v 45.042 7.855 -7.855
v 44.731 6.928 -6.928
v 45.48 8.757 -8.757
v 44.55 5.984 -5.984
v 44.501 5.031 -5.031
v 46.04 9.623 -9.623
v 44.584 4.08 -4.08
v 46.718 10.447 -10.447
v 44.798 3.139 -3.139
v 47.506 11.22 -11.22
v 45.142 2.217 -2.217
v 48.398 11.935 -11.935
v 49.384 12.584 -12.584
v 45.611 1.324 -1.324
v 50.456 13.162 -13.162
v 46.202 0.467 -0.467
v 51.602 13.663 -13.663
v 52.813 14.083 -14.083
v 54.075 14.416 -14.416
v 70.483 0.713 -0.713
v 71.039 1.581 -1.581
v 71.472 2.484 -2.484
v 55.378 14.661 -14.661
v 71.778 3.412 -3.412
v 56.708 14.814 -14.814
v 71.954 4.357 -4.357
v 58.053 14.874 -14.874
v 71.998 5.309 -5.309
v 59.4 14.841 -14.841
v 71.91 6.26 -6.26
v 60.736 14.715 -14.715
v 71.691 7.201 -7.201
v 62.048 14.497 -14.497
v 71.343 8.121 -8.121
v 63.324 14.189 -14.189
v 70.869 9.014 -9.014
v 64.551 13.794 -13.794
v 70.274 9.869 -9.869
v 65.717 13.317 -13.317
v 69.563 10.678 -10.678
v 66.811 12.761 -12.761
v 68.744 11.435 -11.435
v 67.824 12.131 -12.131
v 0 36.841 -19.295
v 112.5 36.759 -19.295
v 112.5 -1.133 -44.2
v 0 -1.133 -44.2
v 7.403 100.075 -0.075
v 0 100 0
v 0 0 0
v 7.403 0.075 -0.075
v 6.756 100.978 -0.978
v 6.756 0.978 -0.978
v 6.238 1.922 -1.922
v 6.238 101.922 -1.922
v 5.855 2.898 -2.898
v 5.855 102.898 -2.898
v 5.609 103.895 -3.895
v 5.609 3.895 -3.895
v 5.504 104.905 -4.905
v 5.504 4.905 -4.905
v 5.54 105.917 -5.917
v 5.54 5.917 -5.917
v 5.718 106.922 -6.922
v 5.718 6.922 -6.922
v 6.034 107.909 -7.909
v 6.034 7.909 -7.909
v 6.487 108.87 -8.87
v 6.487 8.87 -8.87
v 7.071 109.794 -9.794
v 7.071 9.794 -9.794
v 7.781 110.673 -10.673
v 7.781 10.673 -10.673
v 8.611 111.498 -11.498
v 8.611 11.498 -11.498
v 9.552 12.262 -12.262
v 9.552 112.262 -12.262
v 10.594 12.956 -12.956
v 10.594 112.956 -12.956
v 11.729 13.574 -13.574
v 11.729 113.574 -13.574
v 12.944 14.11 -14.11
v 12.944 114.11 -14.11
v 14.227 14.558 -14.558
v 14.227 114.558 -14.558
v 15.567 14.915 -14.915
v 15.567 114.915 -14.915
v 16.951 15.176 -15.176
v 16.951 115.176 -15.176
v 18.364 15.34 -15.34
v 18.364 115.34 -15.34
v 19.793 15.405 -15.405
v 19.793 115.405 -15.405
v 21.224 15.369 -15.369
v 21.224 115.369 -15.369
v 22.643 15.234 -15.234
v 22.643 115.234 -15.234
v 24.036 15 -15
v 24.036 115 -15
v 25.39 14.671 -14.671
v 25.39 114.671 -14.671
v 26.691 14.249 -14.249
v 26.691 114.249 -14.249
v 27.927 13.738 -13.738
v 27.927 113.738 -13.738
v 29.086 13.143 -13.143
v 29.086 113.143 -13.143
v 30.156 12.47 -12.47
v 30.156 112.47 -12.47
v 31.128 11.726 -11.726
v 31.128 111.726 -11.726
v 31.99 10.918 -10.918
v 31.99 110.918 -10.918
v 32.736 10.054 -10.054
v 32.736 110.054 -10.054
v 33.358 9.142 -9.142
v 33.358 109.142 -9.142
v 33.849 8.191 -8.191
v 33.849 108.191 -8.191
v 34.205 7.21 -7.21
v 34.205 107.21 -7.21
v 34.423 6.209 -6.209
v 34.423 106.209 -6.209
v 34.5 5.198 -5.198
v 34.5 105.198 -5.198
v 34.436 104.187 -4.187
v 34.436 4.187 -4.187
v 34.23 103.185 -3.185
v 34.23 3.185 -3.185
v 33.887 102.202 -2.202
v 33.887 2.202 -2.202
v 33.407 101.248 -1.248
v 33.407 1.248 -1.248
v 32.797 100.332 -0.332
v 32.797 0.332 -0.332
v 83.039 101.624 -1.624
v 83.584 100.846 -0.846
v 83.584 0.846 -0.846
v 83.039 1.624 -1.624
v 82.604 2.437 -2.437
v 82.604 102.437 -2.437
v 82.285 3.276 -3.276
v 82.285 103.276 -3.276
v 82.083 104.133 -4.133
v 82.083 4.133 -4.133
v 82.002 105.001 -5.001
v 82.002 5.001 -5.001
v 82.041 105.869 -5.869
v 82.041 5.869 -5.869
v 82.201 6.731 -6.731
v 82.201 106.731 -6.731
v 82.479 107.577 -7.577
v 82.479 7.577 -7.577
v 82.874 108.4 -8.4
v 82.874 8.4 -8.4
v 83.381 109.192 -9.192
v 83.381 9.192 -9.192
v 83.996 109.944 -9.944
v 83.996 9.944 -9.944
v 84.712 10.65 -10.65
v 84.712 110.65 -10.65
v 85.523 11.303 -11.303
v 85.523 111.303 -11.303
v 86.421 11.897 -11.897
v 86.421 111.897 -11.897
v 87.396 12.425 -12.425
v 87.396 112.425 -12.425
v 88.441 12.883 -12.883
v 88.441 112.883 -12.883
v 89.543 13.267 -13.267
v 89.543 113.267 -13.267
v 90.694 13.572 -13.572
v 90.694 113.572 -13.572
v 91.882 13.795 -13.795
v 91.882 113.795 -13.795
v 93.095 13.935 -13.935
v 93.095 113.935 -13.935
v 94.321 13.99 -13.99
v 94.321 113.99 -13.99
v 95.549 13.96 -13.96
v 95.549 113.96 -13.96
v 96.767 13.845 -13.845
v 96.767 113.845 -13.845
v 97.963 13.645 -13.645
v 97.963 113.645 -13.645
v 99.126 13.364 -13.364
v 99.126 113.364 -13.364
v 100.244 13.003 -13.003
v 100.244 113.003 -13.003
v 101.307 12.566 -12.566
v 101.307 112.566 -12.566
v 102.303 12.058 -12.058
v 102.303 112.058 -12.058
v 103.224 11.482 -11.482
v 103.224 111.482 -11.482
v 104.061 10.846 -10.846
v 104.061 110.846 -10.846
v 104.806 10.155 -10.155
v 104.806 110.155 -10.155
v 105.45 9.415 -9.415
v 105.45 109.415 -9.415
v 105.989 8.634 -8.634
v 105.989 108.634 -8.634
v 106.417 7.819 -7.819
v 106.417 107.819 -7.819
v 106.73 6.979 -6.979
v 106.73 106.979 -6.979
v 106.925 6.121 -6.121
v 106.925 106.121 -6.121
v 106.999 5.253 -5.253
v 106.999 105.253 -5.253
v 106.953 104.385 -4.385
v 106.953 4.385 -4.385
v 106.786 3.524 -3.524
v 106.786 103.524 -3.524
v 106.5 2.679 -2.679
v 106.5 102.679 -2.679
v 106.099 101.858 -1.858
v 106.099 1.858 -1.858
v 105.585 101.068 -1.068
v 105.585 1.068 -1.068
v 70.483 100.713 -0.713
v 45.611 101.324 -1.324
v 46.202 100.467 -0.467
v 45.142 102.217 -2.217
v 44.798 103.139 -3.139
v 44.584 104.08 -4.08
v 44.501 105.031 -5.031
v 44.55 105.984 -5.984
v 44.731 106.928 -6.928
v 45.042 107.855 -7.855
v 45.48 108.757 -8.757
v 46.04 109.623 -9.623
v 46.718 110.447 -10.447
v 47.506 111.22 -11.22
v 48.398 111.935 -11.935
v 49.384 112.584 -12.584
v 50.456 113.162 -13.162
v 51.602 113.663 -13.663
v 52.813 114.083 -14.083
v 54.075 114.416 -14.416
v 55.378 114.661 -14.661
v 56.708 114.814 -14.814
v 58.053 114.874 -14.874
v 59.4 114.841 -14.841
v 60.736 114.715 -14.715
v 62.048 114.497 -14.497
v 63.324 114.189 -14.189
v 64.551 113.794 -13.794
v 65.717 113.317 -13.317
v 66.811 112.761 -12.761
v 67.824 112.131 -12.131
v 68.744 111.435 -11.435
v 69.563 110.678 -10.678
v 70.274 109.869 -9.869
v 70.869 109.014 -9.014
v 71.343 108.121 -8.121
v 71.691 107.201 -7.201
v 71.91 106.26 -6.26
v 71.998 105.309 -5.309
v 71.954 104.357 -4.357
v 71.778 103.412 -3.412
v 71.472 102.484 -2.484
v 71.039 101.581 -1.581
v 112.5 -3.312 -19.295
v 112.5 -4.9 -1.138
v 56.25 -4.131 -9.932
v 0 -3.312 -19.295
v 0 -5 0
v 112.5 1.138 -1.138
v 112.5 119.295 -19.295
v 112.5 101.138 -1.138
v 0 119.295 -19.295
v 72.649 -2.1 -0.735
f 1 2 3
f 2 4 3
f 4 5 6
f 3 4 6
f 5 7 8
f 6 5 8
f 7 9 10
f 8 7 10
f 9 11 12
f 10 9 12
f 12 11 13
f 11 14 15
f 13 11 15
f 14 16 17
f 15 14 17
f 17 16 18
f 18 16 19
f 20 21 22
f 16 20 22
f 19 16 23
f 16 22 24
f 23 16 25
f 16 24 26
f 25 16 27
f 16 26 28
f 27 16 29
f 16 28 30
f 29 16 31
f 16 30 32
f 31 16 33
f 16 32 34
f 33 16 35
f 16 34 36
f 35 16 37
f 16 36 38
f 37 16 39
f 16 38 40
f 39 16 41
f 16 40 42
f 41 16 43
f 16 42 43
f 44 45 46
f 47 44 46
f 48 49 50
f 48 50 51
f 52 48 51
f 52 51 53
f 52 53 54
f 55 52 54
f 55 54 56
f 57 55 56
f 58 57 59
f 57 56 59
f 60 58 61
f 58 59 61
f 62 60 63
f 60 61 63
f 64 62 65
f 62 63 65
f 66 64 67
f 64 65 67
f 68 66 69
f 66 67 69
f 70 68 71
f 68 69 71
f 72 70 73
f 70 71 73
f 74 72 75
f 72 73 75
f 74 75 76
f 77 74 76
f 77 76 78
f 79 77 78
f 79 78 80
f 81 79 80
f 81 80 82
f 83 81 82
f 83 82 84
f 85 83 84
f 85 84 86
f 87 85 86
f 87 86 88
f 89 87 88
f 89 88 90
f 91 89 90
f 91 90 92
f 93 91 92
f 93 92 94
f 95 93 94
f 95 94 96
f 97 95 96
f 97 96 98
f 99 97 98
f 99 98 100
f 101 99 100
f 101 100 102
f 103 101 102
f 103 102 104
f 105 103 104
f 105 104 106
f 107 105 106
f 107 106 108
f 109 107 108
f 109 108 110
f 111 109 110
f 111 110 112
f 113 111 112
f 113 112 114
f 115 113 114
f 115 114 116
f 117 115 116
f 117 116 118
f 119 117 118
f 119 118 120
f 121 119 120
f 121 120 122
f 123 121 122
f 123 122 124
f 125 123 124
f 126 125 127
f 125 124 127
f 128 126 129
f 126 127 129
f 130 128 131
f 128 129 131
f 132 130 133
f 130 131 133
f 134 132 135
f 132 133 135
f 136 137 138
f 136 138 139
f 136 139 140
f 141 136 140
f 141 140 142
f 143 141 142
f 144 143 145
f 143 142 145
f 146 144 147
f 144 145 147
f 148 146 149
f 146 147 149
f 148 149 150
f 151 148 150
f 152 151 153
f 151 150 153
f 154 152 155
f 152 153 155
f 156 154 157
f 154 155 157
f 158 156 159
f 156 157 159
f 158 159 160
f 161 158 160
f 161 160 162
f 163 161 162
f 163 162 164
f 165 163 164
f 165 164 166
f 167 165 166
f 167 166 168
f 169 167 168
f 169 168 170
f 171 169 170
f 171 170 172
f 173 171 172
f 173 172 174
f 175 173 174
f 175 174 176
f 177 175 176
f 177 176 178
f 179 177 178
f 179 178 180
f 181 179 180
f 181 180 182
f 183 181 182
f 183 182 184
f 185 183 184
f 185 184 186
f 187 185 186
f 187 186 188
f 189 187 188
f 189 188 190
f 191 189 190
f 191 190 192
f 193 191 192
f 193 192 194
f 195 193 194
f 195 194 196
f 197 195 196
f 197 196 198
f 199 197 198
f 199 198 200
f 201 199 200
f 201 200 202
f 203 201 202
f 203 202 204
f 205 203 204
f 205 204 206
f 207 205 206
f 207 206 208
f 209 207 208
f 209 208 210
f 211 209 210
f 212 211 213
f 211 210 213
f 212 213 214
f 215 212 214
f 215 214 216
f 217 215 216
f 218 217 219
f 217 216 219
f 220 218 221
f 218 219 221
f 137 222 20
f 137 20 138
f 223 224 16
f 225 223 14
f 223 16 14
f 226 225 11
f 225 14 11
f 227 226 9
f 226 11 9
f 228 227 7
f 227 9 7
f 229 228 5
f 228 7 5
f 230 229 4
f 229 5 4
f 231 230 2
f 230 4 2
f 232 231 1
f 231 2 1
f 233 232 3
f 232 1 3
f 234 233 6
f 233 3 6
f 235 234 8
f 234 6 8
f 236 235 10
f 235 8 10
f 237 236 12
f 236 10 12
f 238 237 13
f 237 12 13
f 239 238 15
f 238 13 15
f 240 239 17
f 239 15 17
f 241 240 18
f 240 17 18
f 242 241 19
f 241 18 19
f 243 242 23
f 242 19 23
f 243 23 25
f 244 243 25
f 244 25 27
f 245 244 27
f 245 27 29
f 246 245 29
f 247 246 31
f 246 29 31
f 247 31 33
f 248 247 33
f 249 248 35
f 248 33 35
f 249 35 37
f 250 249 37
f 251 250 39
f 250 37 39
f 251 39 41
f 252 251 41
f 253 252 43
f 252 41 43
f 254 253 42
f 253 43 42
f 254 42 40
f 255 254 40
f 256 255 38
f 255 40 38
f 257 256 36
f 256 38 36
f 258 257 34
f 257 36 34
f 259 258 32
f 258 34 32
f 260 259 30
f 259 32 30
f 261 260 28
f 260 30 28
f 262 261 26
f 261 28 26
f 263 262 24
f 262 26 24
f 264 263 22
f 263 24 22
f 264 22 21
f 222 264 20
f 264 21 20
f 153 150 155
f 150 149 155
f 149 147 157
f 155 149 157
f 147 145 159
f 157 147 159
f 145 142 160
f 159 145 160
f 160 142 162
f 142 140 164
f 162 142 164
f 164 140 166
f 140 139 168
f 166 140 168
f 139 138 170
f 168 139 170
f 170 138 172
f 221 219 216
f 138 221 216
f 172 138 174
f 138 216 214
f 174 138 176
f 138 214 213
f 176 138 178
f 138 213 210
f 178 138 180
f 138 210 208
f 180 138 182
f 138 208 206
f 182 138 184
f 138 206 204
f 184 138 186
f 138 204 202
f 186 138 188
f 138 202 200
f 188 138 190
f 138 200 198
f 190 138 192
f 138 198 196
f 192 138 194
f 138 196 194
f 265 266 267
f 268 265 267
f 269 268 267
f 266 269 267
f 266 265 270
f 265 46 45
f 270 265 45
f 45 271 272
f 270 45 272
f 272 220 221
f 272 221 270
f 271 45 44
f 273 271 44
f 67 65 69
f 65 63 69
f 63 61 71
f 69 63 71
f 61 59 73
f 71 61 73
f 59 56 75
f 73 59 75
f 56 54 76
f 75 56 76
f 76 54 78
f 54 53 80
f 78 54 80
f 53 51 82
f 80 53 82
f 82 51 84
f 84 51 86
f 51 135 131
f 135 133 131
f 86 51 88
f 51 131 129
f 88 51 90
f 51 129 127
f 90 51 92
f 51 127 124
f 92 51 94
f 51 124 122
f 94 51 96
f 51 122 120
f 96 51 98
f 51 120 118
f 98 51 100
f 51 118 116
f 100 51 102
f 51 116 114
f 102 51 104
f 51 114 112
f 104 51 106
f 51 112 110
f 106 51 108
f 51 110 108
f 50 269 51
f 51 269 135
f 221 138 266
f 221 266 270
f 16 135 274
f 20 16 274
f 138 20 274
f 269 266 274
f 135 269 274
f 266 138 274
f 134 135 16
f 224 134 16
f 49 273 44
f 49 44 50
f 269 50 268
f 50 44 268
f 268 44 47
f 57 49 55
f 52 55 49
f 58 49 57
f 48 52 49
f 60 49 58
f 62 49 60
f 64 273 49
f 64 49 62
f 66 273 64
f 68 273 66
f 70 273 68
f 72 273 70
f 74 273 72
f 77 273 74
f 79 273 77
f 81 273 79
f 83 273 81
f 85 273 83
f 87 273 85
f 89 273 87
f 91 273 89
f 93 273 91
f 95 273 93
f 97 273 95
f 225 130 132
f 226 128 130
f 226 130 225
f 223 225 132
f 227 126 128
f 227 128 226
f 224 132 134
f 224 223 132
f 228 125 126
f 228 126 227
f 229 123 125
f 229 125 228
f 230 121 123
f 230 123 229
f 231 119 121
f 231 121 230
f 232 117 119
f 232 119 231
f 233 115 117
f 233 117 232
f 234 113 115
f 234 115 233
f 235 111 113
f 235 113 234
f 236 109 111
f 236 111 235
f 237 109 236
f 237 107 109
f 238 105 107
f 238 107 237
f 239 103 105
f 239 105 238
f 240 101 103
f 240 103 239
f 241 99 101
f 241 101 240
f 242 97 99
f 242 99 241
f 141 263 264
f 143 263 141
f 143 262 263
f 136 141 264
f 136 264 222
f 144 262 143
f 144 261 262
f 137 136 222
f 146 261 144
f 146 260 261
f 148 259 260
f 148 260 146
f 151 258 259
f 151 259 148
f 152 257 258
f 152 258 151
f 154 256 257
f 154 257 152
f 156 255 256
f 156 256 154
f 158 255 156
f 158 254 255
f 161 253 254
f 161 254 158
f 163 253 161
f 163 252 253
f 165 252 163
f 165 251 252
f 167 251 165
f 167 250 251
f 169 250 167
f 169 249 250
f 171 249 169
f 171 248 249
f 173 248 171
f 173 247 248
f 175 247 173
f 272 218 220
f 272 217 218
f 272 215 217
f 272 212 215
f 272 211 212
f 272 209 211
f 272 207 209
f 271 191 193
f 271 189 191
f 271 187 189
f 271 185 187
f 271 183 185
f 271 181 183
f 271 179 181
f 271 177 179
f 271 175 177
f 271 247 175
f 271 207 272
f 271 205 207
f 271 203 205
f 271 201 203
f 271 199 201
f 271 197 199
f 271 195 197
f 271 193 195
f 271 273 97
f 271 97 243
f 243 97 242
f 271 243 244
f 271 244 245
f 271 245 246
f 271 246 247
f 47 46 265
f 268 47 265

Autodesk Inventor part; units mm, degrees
ref_plane "YZ Plane" through (0, 0, 0) normal (1, 0, 0) x (0, 1, 0)
ref_plane "XZ Plane" through (0, 0, 0) normal (0, 1, 0) x (-1, 0, 0)
sketch "Sketch1" plane through (0, 0, 0) normal (0, 0, 1) x (1, 0, 0)
  arc A0 (12.7973, -6.8176) -> (-12.597, -7.1809) centre (0, 0) ccw
  arc A1 (50.4829, -6.2785) -> (26.2017, -6.6259) centre (38.25, 0) ccw
  arc A2 (85.5853, -5.7763) -> (63.5844, -6.091) centre (74.5, 0) ccw
  arc A3 (117.8988, -5.314) -> (98.5072, -5.5914) centre (108.125, 0) ccw
  arc A4 (147.9764, -4.8837) -> (130.6669, -5.1313) centre (139.25, 0) ccw
  arc A5 (177.1345, -4.4665) -> (160.4967, -4.7045) centre (168.75, 0) ccw
  line L0 (-20, 20) -> (188.75, 20)
  line L1 (188.75, 20) -> (188.75, -4.3003)
  line L2 (-20, 20) -> (-20, -7.2868)
  line L3 (-20, -7.2868) -> (188.75, -4.3003)
  dimension "d0" = 29
  dimension "d1" = 27.5
  dimension "d2" = 25
  dimension "d3" = 22.25
  dimension "d4" = 20
  dimension "d5" = 19
  dimension "d6" = 38.25
  dimension "d7" = 36.25
  dimension "d8" = 33.625
  dimension "d9" = 31.125
  dimension "d10" = 29.5
  dimension "d11" = 0
  dimension "d12" = 0
  dimension "d13" = 0
  dimension "d14" = 0
  dimension "d15" = 0
  dimension "d20" = 20
  dimension "d22" = 20
  dimension "d23" = 20
  dimension "d24" = 7
  dimension "d25" = 4.586
sketch "Sketch4" plane through (0, 0, 0) normal (1, 0, 0) x (0, 1, 0)
  line L0 (0, 0) -> (29.9033, -29.9033)
  line L1 (0, 5.9807) -> (0, -35.884) projected
  point P0 (100, 0)
  dimension "d51" = 45
  dimension "d53" = 0
  dimension "d55" = 29.9033
  dimension "d98" = 100
ref_plane "Work Plane4" through (0, 100, 0) normal (0, 0.7071068, 0.7071068) x (1, 0, 0)
ref_plane "Work Plane3" through (-10, 0, 0) normal (0, 0.7071068, 0.7071068) x (1, 0, 0)
sketch "Sketch5" plane through (-10, 0, 0) normal (0, 0.7071068, 0.7071068) x (1, 0, 0)
  arc A0 (42.7973, 0.4692) -> (17.403, 0.1059) centre (30, 7.2868) ccw
  arc A1 (80.4829, 1.0084) -> (56.2017, 0.661) centre (68.25, 7.2868) ccw
  arc A2 (115.5853, 1.5106) -> (93.5844, 1.1958) centre (104.5, 7.2868) ccw
  arc A3 (147.8988, 1.9729) -> (128.5072, 1.6954) centre (138.125, 7.2868) ccw
  arc A4 (177.9764, 2.4032) -> (160.6669, 2.1555) centre (169.25, 7.2868) ccw
  arc A5 (207.1345, 2.8203) -> (190.4967, 2.5823) centre (198.75, 7.2868) ccw
  line L0 (10, 27.2868) -> (218.75, 27.2868)
  line L1 (218.75, 27.2868) -> (218.75, 2.9865)
  line L2 (10, 27.2868) -> (10, 0)
  line L3 (10, 0) -> (17.403, 0.1059)
  line L4 (42.7973, 0.4692) -> (56.2017, 0.661)
  line L5 (80.4829, 1.0084) -> (93.5844, 1.1958)
  line L6 (115.5853, 1.5106) -> (128.5072, 1.6954)
  line L7 (207.1345, 2.8203) -> (218.75, 2.9865)
  line L8 (147.8988, 1.9729) -> (160.6669, 2.1555)
  line L9 (177.9764, 2.4032) -> (190.4967, 2.5823)
  dimension "d56" = 29
  dimension "d57" = 27.5
  dimension "d58" = 25
  dimension "d59" = 22.25
  dimension "d60" = 20
  dimension "d61" = 19
  dimension "d62" = 38.25
  dimension "d63" = 36.25
  dimension "d64" = 33.625
  dimension "d65" = 31.125
  dimension "d66" = 29.5
  dimension "d67" = 0
  dimension "d68" = 0
  dimension "d69" = 0
  dimension "d70" = 0
  dimension "d71" = 0
  dimension "d72" = 20
  dimension "d73" = 20
  dimension "d74" = 20
sketch "Sketch6" plane through (0, 100, 0) normal (0, 0.7071068, 0.7071068) x (1, 0, 0)
  arc A0 (32.7973, 0.4692) -> (7.403, 0.1059) centre (20, 7.2868) ccw
  arc A1 (70.4829, 1.0084) -> (46.2017, 0.661) centre (58.25, 7.2868) ccw
  arc A2 (105.5853, 1.5106) -> (83.5844, 1.1958) centre (94.5, 7.2868) ccw
  arc A3 (137.8988, 1.9729) -> (118.5072, 1.6954) centre (128.125, 7.2868) ccw
  arc A4 (167.9764, 2.4032) -> (150.6669, 2.1555) centre (159.25, 7.2868) ccw
  arc A5 (197.1345, 2.8203) -> (180.4967, 2.5823) centre (188.75, 7.2868) ccw
  line L0 (0, 27.2868) -> (208.75, 27.2868)
  line L1 (208.75, 27.2868) -> (208.75, 2.9865)
  line L2 (0, 27.2868) -> (0, 0)
  line L3 (0, 0) -> (7.403, 0.1059)
  line L4 (32.7973, 0.4692) -> (46.2017, 0.661)
  line L5 (70.4829, 1.0084) -> (83.5844, 1.1958)
  line L6 (105.5853, 1.5106) -> (118.5072, 1.6954)
  line L7 (137.8988, 1.9729) -> (150.6669, 2.1555)
  line L8 (167.9764, 2.4032) -> (180.4967, 2.5823)
  line L9 (197.1345, 2.8203) -> (208.75, 2.9865)
  point P0 (0, -70.7107)
  dimension "d77" = 29
  dimension "d78" = 27.5
  dimension "d79" = 25
  dimension "d80" = 22.25
  dimension "d81" = 20
  dimension "d82" = 19
  dimension "d83" = 38.25
  dimension "d84" = 36.25
  dimension "d85" = 33.625
  dimension "d86" = 31.125
  dimension "d87" = 29.5
  dimension "d88" = 0
  dimension "d89" = 0
  dimension "d90" = 0
  dimension "d91" = 0
  dimension "d92" = 0
  dimension "d93" = 20
  dimension "d94" = 20
  dimension "d95" = 20
loft "Loft1" add profiles "Sketch6", "Sketch5"
sketch "Sketch7" plane through (0, 0, 0) normal (0, 1, 0) x (-1, 0, 0)
  line L0 (0, 0) -> (0, -19.2947) projected
  line L1 (0, -19.2947) -> (-208.75, -19.2947) projected
  line L2 (-208.75, -19.2947) -> (-208.75, -2.1118) projected
  line L3 (-208.75, -2.1118) -> (-197.1345, -1.9943) projected
  ellipse E0 centre (-188.75, -5.1526) end of major axis (-198.25, -5.1526) minor radius 6.7175 (-197.1345, -1.9943) -> (-180.4967, -1.826) ccw projected
  line L4 (-180.4967, -1.826) -> (-167.9764, -1.6993) projected
  ellipse E1 centre (-159.25, -5.1526) end of major axis (-169.25, -5.1526) minor radius 7.0711 (-167.9764, -1.6993) -> (-150.6669, -1.5242) ccw projected
  line L5 (-150.6669, -1.5242) -> (-137.8988, -1.395) projected
  ellipse E2 centre (-128.125, -5.1526) end of major axis (-139.25, -5.1526) minor radius 7.8666 (-137.8988, -1.395) -> (-118.5072, -1.1989) ccw projected
  line L6 (-118.5072, -1.1989) -> (-105.5853, -1.0681) projected
  ellipse E3 centre (-94.5, -5.1526) end of major axis (-107, -5.1526) minor radius 8.8388 (-105.5853, -1.0681) -> (-83.5844, -0.8456) ccw projected
  line L7 (-83.5844, -0.8456) -> (-70.4829, -0.713) projected
  ellipse E4 centre (-58.25, -5.1526) end of major axis (-72, -5.1526) minor radius 9.7227 (-70.4829, -0.713) -> (-46.2017, -0.4674) ccw projected
  line L8 (-46.2017, -0.4674) -> (-32.7973, -0.3318) projected
  ellipse E5 centre (-20, -5.1526) end of major axis (-34.5, -5.1526) minor radius 10.253 (-32.7973, -0.3318) -> (-7.403, -0.0749) ccw projected
  line L9 (-7.403, -0.0749) -> (0, 0) projected
  line L10 (0, 0) -> (0, -19.2947)
  line L11 (0, -19.2947) -> (-208.75, -19.2947)
  line L12 (-208.75, -19.2947) -> (-208.75, -2.1118)
  line L13 (-208.75, -2.1118) -> (0, 0)
sketch "Sketch10" plane through (0, 19.2947, -19.2947) normal (-1, 0, 0) x (0, 0, 1)
  line L0 (19.2947, 80.7053) -> (0, 100) projected
  line L1 (0, 100) -> (0, 0) projected
  line L2 (19.2947, -19.2947) -> (0, 0) projected
  line L3 (19.2947, 80.7053) -> (19.2947, -19.2947) projected
  line L4 (19.2947, -19.2947) -> (19.2947, -24.2947)
  line L5 (0, 0) -> (0, -22.6066)
  line L6 (0, -22.6066) -> (19.2947, -24.2947)
  line L7 (0, -22.6066) -> (-24.9049, -20.4278)
  line L8 (-24.9049, -20.4278) -> (0, 17.5461)
  line L9 (0, 100) -> (0, 0) projected
  line L10 (0, 17.5461) -> (0, 0)
  point P0 (19.2947, -19.2947)
  dimension "d106" = 5
  dimension "d111" = 85
  dimension "d113" = 25
  dimension "d114" = 40
sketch "Sketch11" plane through (208.75, 2.1118, -2.1118) normal (1, 0, 0) x (0, 0, -1)
  line L0 (17.1829, 117.1829) -> (0, 100) projected
  line L1 (0, 100) -> (0, 0) projected
  line L2 (17.1829, 17.1829) -> (0, 0) projected
  line L3 (17.1829, 117.1829) -> (17.1829, 17.1829) projected
  line L4 (17.1829, 17.1829) -> (0, 0)
  line L5 (10.1119, 10.1119) -> (-0.5876, -0.5876) projected
  line L6 (17.1829, -5.4237) -> (-2.1118, -7.1118) projected
  line L7 (0, 0) -> (0, -6.927)
  line L8 (17.1829, -5.4237) -> (0, -6.927)
  line L9 (17.1829, -5.4237) -> (17.1829, 17.1829)
  line L10 (0, -6.927) -> (17.1829, -5.4237)
  line L11 (17.1829, -5.4237) -> (42.0878, -3.2448)
  line L12 (42.0878, -3.2448) -> (17.1829, 34.5763)
  line L13 (17.1829, 117.1829) -> (17.1829, 17.1829) projected
  line L14 (17.1829, 17.1829) -> (17.1829, 34.5763)
  point P0 (-2.1118, -2.1118)
  point P1 (17.1829, -7.1118)
  point P2 (-0.4125, -0.4125)
  dimension "d115" = 25
  dimension "d116" = 40
loft "Loft3" add profiles "Sketch10", "Sketch11" contours L4 L6 L5 L2 | L1 L5 L7 L8 / L12 L11 L9 L3 | L2 L9 L6 L7
sketch "Sketch13" plane through (0, -1.133, -44.1996) normal (0, -0.9961947, -0.0871557) x (1, 0, 0)
  line L0 (0, 35.2171) -> (0, 14.3141) projected
  line L1 (7.403, 35.1359) -> (0, 35.2171) projected
  ellipse E0 centre (20, 29.635) end of major axis (5.5, 29.635) minor radius 11.1076 (7.403, 35.1359) -> (32.7973, 34.8576) ccw projected
  line L2 (46.2017, 34.7107) -> (32.7973, 34.8576) projected
  ellipse E1 centre (58.25, 29.635) end of major axis (44.5, 29.635) minor radius 10.5331 (46.2017, 34.7107) -> (70.4829, 34.4446) ccw projected
  line L3 (83.5844, 34.301) -> (70.4829, 34.4446) projected
  ellipse E2 centre (94.5, 29.635) end of major axis (82, 29.635) minor radius 9.5756 (83.5844, 34.301) -> (105.5853, 34.0599) ccw projected
  line L4 (118.5072, 33.9183) -> (105.5853, 34.0599) projected
  ellipse E3 centre (128.125, 29.635) end of major axis (117, 29.635) minor radius 8.5222 (118.5072, 33.9183) -> (137.8988, 33.7058) ccw projected
  line L5 (150.6669, 33.5658) -> (137.8988, 33.7058) projected
  ellipse E4 centre (159.25, 29.635) end of major axis (149.25, 29.635) minor radius 7.6604 (150.6669, 33.5658) -> (167.9764, 33.3761) ccw projected
  line L6 (180.4967, 33.2389) -> (167.9764, 33.3761) projected
  ellipse E5 centre (188.75, 29.635) end of major axis (179.25, 29.635) minor radius 7.2774 (180.4967, 33.2389) -> (197.1345, 33.0566) ccw projected
  line L7 (208.75, 32.9293) -> (197.1345, 33.0566) projected
  line L8 (208.75, 14.3141) -> (208.75, 32.9293) projected
  line L9 (0, 14.3141) -> (208.75, 14.3141) projected
  line L10 (0, 0) -> (0, 44.3684) projected
  line L11 (0, 0) -> (208.75, 0) projected
  line L12 (208.75, 0) -> (208.75, 42.2486) projected
  line L13 (0, 44.3684) -> (208.75, 42.2486) projected
  line L14 (0, 0) -> (208.75, 0) projected
  line L15 (112.5, 0) -> (112.5, 43.226)
  point P0 (0, 43.9326)
  dimension "d122" = 18
split body "Split1" sketch "Sketch13" result one side removed curves L15 removed pieces at (176.6667, 64.2471, -18.7947)
properties part number "coin_holder_large_only"
